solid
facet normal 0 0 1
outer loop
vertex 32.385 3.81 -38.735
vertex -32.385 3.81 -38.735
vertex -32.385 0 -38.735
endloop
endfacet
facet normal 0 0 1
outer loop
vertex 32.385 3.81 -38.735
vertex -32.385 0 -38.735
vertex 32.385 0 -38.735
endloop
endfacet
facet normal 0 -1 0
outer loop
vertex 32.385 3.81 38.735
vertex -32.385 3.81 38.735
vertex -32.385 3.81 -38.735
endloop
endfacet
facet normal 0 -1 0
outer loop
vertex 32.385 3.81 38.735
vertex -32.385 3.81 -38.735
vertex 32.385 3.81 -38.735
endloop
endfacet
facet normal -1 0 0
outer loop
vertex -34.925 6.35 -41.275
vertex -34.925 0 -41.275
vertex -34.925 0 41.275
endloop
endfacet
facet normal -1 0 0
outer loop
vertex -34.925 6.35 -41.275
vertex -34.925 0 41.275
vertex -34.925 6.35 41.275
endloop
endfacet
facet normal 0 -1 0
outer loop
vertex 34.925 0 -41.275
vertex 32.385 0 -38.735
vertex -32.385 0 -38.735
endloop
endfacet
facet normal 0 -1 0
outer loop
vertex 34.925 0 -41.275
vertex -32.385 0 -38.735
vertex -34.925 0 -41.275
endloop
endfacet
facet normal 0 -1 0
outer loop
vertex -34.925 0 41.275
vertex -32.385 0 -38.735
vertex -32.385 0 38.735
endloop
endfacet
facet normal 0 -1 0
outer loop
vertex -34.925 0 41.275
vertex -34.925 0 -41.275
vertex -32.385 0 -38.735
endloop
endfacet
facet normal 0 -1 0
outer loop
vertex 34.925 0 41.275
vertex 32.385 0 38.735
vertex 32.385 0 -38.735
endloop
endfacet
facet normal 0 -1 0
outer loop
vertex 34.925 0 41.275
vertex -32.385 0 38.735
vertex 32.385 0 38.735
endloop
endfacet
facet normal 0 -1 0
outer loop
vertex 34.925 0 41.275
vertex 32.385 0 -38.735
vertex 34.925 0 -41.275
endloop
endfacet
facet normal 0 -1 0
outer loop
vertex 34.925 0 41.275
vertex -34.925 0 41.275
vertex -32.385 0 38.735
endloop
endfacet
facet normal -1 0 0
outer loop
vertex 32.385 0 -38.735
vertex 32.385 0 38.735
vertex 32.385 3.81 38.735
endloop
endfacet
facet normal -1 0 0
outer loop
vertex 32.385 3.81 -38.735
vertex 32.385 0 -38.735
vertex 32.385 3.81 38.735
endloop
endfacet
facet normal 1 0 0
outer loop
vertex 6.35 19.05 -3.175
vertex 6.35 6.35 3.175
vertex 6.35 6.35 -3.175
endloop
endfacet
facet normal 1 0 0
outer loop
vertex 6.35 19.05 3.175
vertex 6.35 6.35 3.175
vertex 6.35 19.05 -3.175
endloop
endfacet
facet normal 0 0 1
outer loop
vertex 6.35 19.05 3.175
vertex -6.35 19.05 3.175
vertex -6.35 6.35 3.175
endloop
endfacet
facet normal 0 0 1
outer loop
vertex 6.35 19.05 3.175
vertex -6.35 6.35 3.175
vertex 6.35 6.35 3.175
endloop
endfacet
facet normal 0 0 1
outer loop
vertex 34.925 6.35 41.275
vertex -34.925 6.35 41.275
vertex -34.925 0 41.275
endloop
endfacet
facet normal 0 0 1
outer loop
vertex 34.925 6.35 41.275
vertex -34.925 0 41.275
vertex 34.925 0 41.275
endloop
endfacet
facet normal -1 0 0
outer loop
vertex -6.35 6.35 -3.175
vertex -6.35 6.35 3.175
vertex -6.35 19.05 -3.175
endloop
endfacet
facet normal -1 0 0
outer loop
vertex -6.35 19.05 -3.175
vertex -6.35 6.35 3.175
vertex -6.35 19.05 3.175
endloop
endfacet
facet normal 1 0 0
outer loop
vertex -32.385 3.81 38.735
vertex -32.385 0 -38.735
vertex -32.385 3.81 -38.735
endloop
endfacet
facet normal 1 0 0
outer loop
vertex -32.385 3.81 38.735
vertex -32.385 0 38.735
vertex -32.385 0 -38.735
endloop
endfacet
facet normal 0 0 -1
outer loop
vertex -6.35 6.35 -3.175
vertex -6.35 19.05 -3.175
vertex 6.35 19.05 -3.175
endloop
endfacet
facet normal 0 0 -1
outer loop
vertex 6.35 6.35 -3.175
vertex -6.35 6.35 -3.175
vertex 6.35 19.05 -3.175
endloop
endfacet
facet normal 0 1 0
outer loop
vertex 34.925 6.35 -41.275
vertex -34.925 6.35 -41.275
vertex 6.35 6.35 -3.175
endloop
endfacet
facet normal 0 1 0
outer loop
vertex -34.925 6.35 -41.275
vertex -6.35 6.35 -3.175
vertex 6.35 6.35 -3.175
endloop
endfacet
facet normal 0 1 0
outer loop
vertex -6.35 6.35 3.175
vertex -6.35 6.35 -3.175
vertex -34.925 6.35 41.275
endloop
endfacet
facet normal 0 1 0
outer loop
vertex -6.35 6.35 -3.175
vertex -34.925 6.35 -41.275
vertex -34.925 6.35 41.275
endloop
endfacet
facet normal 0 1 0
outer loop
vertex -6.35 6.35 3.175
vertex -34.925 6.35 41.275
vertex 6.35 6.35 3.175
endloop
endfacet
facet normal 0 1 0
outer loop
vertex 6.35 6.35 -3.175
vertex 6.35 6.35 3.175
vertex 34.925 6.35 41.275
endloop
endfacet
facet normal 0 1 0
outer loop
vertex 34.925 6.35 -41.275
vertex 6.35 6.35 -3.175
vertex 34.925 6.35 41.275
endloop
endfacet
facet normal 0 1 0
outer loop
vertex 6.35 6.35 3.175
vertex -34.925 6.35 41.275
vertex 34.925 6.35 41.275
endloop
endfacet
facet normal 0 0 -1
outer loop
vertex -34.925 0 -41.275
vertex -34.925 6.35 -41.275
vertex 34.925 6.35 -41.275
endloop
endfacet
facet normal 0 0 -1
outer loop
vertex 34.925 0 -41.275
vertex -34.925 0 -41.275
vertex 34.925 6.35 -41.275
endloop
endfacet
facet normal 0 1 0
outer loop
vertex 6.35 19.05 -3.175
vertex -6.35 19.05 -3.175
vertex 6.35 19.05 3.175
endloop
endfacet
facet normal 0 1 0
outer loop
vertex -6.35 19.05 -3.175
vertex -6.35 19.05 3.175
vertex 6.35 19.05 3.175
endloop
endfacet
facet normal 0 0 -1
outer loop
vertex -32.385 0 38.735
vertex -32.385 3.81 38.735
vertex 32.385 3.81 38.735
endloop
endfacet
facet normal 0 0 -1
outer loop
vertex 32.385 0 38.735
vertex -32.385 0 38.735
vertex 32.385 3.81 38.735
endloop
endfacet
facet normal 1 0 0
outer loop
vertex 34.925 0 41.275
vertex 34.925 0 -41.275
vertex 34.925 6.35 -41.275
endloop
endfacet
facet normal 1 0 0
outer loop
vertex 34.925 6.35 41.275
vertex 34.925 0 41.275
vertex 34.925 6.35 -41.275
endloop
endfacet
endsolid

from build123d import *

# Parameters (mm, degrees)
SKETCH1_W           = 69.85
SKETCH1_H           = 6.35
BOSS_EXTRUDE1_DEPTH = 41.275
SHELL1_T            = -2.54
SKETCH2_W           = 12.7
SKETCH2_H           = 12.7
BOSS_EXTRUDE2_DEPTH = 3.175


with BuildPart() as part:
    # Sketch1 → Boss-Extrude1 (new, symmetric)
    with BuildSketch(Plane.XY):
        with Locations((0, 3.175)):
            Rectangle(SKETCH1_W, SKETCH1_H)
    extrude(amount=BOSS_EXTRUDE1_DEPTH, both=True)

    # Shell1
    shell1_openings = [part.faces().sort_by_distance(p)[0] for p in [
        (0, 0, 0),
    ]]
    offset(amount=SHELL1_T, openings=shell1_openings, kind=Kind.INTERSECTION)

    # Sketch2 → Boss-Extrude2 (add, symmetric)
    with BuildSketch(Plane.XY):
        with Locations((0, 12.7)):
            Rectangle(SKETCH2_W, SKETCH2_H)
    extrude(amount=BOSS_EXTRUDE2_DEPTH, both=True)


solid = part.part
